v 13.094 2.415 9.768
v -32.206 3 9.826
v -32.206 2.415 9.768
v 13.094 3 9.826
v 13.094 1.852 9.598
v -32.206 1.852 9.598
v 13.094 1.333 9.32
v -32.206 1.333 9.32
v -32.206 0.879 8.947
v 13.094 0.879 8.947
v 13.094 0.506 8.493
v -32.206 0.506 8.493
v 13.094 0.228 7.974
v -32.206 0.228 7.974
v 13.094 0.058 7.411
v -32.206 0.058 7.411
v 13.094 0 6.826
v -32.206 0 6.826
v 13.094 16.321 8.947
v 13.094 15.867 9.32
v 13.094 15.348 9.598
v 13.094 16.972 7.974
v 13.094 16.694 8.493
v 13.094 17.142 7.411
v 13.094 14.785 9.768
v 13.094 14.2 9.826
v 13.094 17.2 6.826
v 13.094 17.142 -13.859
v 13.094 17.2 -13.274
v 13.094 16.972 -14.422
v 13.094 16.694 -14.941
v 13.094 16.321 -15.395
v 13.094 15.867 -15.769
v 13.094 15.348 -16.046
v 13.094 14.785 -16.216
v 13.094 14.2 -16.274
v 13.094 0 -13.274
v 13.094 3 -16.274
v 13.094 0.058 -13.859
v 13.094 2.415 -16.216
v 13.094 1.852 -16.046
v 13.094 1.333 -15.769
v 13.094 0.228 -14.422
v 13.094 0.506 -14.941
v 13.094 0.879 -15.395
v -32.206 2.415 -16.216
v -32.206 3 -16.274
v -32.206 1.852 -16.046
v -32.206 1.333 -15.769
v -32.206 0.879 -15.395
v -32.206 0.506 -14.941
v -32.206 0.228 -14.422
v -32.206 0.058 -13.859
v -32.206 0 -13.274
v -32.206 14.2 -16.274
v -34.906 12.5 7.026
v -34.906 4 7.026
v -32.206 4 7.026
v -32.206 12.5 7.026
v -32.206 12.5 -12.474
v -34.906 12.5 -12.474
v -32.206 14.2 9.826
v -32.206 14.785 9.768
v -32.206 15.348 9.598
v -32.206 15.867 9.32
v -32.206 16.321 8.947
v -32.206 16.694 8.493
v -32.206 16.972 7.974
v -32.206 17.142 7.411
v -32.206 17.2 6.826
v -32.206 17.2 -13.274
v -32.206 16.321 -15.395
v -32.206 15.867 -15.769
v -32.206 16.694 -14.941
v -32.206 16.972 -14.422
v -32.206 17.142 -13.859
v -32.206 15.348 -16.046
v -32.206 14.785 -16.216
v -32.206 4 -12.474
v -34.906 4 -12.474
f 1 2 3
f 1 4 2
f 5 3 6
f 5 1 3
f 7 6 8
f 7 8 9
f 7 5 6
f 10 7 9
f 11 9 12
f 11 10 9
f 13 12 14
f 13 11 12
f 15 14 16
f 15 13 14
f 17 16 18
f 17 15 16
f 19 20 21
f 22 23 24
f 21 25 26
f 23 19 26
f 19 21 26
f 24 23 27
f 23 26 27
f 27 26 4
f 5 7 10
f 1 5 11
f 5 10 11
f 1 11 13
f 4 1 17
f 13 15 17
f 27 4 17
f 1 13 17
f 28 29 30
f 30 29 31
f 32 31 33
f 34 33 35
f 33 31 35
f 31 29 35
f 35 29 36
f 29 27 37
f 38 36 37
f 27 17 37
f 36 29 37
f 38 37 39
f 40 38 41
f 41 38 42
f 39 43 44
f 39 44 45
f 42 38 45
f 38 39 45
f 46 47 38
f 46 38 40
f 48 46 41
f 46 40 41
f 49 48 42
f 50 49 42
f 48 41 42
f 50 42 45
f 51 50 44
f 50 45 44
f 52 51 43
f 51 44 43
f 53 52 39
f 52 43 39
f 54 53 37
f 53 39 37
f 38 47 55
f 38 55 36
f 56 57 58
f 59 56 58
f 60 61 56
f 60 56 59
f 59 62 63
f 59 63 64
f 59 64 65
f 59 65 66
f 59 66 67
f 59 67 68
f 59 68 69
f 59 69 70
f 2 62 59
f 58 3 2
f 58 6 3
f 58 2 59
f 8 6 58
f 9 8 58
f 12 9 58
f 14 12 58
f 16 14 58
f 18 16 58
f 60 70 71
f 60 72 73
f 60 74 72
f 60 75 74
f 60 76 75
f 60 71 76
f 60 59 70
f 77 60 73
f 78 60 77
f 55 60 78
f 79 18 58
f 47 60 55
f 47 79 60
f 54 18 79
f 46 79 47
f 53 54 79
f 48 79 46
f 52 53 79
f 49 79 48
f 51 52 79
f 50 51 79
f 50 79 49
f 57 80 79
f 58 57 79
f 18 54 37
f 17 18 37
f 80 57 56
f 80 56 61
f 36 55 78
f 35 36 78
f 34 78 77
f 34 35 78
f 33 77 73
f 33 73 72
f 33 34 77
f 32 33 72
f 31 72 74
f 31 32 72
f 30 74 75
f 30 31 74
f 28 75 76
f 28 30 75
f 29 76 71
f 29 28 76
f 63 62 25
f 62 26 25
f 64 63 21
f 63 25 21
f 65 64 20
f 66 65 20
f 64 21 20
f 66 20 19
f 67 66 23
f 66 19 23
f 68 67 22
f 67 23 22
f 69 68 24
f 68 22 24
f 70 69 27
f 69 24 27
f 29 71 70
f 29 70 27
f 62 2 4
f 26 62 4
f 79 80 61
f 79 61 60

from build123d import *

# Parameters (mm, degrees)
BOSS_EXTRUDE1_DEPTH = 17.2
FILLET1_R           = 3
BOSS_EXTRUDE2_START = 4
SKETCH1_3_W         = 2.7
SKETCH1_3_H         = 19.5
BOSS_EXTRUDE2_DEPTH = 8.5


with BuildPart() as part:
    # Sketch1 → Boss-Extrude1 (new body)
    with BuildSketch(Plane(origin=(0, 0, 0), x_dir=(1, 0, 0), z_dir=(0, 1, 0))):
        Polygon((-32.206070131, -7.025882353), (-32.206070131, -9.825882353), (13.093929869, -9.825882353), (13.093929869, 16.274117647), (-32.206070131, 16.274117647), (-32.206070131, 12.474117647), align=None)
    extrude(amount=BOSS_EXTRUDE1_DEPTH)

    # Fillet1
    fillet1_edges = [part.edges().sort_by_distance(p)[0] for p in [
        (-9.556070131, 17.2, -16.274117647),
        (-9.556070131, 0, -16.274117647),
        (-9.556070131, 0, 9.825882353),
        (-9.556070131, 17.2, 9.825882353),
    ]]
    fillet(fillet1_edges, radius=FILLET1_R)

    # Sketch1<3> → Boss-Extrude2 (add)
    with BuildSketch(Plane(origin=(0, 0, 0), x_dir=(1, 0, 0), z_dir=(0, 1, 0)).offset(BOSS_EXTRUDE2_START)):
        with Locations((-33.556070131, 2.724117647)):
            Rectangle(SKETCH1_3_W, SKETCH1_3_H)
    extrude(amount=BOSS_EXTRUDE2_DEPTH)


solid = part.part
